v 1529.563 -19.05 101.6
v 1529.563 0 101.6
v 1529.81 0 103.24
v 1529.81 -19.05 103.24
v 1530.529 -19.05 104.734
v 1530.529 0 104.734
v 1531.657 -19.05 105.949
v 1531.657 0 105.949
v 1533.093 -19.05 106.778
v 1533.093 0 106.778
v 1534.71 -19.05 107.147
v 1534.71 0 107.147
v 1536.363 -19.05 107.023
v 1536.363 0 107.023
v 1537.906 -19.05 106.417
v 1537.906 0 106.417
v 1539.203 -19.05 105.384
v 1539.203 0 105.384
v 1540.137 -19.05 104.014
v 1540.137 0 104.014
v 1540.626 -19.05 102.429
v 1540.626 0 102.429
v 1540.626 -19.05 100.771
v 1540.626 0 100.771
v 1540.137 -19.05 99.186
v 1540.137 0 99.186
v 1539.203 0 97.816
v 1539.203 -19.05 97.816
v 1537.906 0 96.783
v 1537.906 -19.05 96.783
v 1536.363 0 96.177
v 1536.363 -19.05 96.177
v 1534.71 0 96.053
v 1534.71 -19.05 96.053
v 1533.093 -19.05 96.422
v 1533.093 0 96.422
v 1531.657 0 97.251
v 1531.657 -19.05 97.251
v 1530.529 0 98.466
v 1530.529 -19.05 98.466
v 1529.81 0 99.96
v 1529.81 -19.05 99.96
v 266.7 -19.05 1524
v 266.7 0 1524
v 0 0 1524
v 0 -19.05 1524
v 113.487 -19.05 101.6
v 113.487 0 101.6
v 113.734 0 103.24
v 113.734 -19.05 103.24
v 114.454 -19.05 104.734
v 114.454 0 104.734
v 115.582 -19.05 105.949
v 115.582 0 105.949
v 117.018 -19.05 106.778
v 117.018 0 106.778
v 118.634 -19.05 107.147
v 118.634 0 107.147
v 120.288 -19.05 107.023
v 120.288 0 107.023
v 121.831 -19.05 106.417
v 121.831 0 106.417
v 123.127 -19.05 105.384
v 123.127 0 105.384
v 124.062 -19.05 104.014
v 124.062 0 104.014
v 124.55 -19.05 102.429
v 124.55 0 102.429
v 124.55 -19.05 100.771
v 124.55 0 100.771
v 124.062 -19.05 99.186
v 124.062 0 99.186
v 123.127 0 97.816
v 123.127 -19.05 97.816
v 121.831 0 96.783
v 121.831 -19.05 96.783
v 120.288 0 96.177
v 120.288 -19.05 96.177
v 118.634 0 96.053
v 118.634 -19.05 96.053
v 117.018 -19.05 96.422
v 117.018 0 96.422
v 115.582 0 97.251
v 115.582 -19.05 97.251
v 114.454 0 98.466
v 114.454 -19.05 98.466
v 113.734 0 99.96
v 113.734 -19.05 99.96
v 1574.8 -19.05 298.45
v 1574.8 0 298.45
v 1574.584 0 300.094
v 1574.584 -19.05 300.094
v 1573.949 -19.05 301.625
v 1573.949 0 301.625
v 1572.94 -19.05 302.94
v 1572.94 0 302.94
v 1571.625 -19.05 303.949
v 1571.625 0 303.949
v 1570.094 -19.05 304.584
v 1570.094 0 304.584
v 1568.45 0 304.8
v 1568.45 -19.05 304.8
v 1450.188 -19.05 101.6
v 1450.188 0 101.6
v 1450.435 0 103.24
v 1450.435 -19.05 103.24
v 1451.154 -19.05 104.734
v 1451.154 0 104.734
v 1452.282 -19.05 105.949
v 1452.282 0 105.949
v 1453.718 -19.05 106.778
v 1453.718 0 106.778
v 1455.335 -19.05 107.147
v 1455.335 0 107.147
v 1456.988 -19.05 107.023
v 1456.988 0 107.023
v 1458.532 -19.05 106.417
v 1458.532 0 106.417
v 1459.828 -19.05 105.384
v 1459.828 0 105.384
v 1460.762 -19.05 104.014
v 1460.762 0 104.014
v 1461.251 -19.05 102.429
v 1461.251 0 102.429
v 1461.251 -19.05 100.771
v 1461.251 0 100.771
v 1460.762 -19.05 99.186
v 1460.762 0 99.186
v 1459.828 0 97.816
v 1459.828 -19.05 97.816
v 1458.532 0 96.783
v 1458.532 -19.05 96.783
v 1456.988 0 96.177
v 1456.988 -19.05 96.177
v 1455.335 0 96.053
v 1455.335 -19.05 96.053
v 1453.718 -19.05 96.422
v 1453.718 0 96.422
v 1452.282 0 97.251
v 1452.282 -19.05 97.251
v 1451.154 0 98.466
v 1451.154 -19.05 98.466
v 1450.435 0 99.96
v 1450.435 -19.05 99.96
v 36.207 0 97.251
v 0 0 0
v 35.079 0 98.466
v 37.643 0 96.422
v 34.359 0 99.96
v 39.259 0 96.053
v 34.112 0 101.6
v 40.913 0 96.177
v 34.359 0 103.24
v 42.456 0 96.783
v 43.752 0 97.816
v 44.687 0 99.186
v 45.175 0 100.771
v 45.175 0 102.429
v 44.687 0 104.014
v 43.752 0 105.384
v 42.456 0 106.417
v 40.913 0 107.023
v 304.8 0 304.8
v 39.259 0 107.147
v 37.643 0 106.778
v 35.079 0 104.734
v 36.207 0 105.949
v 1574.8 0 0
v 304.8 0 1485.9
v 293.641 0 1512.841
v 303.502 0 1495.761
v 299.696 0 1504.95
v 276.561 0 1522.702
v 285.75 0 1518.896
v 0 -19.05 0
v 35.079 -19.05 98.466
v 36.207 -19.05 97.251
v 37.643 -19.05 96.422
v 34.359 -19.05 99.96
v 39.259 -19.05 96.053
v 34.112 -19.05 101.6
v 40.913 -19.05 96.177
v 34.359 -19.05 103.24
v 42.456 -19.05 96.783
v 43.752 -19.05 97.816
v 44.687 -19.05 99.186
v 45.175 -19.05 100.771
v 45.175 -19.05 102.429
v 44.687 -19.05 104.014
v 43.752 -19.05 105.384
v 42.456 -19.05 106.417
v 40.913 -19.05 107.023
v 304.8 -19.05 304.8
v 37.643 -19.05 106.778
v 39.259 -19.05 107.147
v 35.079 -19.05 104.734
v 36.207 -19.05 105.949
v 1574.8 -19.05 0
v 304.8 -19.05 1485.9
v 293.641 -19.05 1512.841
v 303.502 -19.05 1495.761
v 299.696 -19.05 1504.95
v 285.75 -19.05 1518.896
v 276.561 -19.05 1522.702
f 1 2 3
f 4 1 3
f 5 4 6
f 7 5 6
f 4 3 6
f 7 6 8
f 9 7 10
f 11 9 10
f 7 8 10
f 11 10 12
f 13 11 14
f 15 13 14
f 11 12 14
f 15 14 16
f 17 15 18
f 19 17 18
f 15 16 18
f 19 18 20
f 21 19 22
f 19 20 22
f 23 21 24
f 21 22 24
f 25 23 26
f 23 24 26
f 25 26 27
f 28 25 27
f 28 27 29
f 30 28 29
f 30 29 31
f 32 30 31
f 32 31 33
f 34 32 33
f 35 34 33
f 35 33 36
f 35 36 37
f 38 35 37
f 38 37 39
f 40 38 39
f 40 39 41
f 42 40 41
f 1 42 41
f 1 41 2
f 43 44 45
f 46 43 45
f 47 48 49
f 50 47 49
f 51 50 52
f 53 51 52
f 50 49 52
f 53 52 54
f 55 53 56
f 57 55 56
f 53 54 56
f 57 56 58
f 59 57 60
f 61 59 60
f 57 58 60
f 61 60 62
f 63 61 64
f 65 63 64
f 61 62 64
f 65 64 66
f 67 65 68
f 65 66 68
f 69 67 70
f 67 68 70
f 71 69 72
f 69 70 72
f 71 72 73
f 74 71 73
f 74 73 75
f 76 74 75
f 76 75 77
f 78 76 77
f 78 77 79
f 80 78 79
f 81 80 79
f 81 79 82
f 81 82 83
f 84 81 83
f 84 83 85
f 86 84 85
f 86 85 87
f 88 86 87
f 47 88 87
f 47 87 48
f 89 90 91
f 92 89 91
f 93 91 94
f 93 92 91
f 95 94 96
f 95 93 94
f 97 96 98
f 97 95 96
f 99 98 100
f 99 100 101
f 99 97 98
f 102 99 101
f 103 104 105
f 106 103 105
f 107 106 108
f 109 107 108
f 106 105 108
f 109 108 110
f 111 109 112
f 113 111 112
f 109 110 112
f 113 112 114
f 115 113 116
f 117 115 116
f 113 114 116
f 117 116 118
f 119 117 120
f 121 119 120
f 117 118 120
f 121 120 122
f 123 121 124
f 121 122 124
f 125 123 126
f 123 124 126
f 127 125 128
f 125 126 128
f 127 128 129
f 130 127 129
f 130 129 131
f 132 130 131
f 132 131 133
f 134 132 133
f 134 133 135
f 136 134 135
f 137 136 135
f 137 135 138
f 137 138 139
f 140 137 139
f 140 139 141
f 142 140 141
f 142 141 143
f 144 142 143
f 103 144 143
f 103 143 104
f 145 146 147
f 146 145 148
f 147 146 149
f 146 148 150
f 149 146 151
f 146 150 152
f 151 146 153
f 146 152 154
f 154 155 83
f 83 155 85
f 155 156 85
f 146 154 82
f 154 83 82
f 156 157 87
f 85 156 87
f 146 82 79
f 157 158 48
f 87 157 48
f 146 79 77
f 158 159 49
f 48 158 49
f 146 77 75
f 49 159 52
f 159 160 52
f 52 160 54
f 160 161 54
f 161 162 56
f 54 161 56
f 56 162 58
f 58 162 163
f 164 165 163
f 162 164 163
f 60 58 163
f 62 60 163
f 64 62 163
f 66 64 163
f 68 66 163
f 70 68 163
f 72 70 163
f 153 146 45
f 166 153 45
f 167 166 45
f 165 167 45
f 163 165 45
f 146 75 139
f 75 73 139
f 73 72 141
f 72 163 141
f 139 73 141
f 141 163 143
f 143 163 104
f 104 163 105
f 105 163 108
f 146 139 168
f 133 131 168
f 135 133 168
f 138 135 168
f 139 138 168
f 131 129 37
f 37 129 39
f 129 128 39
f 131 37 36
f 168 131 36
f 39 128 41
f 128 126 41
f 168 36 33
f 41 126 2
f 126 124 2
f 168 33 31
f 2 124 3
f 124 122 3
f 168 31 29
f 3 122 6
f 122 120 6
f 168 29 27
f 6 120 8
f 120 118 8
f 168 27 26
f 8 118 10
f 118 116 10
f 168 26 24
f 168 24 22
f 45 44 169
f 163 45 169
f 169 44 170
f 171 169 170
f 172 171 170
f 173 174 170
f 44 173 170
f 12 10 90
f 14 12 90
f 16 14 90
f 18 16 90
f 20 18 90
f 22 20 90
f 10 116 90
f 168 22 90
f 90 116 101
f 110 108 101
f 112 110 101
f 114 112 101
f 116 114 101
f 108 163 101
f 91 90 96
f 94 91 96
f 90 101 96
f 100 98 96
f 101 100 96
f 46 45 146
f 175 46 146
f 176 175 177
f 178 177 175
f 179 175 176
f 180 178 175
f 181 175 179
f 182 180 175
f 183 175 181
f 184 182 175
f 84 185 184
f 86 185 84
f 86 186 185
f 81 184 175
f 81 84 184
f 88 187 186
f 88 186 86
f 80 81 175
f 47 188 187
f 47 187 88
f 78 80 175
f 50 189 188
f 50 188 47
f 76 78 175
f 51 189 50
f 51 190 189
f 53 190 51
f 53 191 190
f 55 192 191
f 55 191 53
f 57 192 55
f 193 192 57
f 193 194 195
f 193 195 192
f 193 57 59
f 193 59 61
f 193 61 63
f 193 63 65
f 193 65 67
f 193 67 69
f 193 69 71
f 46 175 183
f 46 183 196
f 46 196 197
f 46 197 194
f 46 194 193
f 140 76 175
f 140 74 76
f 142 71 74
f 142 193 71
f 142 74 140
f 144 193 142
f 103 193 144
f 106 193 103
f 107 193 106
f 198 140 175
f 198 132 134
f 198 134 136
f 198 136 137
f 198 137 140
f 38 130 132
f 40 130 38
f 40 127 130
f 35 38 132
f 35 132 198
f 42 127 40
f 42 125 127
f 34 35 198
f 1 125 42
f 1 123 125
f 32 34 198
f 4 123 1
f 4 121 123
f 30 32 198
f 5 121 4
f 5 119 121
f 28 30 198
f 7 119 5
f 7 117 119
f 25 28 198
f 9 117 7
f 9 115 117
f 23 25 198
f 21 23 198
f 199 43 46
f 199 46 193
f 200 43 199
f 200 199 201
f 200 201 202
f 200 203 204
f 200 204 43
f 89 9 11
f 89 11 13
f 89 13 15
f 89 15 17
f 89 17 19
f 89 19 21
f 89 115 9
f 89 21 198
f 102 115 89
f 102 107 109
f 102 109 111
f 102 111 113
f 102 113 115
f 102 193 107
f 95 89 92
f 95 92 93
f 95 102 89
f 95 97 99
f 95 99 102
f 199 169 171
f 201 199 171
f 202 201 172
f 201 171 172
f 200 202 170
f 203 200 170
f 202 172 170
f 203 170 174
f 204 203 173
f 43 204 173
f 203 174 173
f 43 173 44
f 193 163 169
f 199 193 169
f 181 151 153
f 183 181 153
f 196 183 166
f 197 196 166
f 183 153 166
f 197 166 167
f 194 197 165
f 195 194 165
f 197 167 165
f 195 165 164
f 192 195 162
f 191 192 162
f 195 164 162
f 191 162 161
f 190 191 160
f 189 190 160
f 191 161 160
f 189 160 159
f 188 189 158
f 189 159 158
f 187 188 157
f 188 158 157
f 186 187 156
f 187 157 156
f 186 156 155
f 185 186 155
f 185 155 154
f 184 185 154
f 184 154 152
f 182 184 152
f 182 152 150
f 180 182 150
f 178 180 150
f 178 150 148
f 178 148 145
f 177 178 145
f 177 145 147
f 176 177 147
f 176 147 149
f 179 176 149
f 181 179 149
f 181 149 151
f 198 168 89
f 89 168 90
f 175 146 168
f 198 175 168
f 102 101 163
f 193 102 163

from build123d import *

# Parameters (mm, degrees)
F1_DEPTH = 19.05
F2_R     = 6.35
F4_D     = 11.1252


with BuildPart() as f1:
    # F0 (on Front) → F1 (new body)
    with BuildSketch(Plane.XZ):
        with BuildLine():
            Line((1371.6, 304.8), (304.8, 304.8))
            Line((304.8, 304.8), (304.8, 1485.9))
            ThreePointArc((304.8, 1485.9), (293.640768, 1512.840768), (266.7, 1524))
            Line((266.7, 1524), (0, 1524))
            Line((0, 1524), (0, 0))
            Line((0, 0), (1574.8, 0))
            Line((1574.8, 0), (1574.8, 304.8))
            Line((1574.8, 304.8), (1371.6, 304.8))
        make_face()
    extrude(amount=F1_DEPTH)

    # F2
    f2_edges = [f1.edges().sort_by_distance(p)[0] for p in [
        (1574.8, -9.525, 304.8),
    ]]
    fillet(f2_edges, radius=F2_R)

    # F4 (through all)
    with Locations(Plane.XZ.offset(19.05)):
        with Locations((1535.1252, 101.6), (1455.7502, 101.6), (119.0498, 101.6), (39.6748, 101.6)):
            Hole(F4_D / 2)


solid = f1.part
